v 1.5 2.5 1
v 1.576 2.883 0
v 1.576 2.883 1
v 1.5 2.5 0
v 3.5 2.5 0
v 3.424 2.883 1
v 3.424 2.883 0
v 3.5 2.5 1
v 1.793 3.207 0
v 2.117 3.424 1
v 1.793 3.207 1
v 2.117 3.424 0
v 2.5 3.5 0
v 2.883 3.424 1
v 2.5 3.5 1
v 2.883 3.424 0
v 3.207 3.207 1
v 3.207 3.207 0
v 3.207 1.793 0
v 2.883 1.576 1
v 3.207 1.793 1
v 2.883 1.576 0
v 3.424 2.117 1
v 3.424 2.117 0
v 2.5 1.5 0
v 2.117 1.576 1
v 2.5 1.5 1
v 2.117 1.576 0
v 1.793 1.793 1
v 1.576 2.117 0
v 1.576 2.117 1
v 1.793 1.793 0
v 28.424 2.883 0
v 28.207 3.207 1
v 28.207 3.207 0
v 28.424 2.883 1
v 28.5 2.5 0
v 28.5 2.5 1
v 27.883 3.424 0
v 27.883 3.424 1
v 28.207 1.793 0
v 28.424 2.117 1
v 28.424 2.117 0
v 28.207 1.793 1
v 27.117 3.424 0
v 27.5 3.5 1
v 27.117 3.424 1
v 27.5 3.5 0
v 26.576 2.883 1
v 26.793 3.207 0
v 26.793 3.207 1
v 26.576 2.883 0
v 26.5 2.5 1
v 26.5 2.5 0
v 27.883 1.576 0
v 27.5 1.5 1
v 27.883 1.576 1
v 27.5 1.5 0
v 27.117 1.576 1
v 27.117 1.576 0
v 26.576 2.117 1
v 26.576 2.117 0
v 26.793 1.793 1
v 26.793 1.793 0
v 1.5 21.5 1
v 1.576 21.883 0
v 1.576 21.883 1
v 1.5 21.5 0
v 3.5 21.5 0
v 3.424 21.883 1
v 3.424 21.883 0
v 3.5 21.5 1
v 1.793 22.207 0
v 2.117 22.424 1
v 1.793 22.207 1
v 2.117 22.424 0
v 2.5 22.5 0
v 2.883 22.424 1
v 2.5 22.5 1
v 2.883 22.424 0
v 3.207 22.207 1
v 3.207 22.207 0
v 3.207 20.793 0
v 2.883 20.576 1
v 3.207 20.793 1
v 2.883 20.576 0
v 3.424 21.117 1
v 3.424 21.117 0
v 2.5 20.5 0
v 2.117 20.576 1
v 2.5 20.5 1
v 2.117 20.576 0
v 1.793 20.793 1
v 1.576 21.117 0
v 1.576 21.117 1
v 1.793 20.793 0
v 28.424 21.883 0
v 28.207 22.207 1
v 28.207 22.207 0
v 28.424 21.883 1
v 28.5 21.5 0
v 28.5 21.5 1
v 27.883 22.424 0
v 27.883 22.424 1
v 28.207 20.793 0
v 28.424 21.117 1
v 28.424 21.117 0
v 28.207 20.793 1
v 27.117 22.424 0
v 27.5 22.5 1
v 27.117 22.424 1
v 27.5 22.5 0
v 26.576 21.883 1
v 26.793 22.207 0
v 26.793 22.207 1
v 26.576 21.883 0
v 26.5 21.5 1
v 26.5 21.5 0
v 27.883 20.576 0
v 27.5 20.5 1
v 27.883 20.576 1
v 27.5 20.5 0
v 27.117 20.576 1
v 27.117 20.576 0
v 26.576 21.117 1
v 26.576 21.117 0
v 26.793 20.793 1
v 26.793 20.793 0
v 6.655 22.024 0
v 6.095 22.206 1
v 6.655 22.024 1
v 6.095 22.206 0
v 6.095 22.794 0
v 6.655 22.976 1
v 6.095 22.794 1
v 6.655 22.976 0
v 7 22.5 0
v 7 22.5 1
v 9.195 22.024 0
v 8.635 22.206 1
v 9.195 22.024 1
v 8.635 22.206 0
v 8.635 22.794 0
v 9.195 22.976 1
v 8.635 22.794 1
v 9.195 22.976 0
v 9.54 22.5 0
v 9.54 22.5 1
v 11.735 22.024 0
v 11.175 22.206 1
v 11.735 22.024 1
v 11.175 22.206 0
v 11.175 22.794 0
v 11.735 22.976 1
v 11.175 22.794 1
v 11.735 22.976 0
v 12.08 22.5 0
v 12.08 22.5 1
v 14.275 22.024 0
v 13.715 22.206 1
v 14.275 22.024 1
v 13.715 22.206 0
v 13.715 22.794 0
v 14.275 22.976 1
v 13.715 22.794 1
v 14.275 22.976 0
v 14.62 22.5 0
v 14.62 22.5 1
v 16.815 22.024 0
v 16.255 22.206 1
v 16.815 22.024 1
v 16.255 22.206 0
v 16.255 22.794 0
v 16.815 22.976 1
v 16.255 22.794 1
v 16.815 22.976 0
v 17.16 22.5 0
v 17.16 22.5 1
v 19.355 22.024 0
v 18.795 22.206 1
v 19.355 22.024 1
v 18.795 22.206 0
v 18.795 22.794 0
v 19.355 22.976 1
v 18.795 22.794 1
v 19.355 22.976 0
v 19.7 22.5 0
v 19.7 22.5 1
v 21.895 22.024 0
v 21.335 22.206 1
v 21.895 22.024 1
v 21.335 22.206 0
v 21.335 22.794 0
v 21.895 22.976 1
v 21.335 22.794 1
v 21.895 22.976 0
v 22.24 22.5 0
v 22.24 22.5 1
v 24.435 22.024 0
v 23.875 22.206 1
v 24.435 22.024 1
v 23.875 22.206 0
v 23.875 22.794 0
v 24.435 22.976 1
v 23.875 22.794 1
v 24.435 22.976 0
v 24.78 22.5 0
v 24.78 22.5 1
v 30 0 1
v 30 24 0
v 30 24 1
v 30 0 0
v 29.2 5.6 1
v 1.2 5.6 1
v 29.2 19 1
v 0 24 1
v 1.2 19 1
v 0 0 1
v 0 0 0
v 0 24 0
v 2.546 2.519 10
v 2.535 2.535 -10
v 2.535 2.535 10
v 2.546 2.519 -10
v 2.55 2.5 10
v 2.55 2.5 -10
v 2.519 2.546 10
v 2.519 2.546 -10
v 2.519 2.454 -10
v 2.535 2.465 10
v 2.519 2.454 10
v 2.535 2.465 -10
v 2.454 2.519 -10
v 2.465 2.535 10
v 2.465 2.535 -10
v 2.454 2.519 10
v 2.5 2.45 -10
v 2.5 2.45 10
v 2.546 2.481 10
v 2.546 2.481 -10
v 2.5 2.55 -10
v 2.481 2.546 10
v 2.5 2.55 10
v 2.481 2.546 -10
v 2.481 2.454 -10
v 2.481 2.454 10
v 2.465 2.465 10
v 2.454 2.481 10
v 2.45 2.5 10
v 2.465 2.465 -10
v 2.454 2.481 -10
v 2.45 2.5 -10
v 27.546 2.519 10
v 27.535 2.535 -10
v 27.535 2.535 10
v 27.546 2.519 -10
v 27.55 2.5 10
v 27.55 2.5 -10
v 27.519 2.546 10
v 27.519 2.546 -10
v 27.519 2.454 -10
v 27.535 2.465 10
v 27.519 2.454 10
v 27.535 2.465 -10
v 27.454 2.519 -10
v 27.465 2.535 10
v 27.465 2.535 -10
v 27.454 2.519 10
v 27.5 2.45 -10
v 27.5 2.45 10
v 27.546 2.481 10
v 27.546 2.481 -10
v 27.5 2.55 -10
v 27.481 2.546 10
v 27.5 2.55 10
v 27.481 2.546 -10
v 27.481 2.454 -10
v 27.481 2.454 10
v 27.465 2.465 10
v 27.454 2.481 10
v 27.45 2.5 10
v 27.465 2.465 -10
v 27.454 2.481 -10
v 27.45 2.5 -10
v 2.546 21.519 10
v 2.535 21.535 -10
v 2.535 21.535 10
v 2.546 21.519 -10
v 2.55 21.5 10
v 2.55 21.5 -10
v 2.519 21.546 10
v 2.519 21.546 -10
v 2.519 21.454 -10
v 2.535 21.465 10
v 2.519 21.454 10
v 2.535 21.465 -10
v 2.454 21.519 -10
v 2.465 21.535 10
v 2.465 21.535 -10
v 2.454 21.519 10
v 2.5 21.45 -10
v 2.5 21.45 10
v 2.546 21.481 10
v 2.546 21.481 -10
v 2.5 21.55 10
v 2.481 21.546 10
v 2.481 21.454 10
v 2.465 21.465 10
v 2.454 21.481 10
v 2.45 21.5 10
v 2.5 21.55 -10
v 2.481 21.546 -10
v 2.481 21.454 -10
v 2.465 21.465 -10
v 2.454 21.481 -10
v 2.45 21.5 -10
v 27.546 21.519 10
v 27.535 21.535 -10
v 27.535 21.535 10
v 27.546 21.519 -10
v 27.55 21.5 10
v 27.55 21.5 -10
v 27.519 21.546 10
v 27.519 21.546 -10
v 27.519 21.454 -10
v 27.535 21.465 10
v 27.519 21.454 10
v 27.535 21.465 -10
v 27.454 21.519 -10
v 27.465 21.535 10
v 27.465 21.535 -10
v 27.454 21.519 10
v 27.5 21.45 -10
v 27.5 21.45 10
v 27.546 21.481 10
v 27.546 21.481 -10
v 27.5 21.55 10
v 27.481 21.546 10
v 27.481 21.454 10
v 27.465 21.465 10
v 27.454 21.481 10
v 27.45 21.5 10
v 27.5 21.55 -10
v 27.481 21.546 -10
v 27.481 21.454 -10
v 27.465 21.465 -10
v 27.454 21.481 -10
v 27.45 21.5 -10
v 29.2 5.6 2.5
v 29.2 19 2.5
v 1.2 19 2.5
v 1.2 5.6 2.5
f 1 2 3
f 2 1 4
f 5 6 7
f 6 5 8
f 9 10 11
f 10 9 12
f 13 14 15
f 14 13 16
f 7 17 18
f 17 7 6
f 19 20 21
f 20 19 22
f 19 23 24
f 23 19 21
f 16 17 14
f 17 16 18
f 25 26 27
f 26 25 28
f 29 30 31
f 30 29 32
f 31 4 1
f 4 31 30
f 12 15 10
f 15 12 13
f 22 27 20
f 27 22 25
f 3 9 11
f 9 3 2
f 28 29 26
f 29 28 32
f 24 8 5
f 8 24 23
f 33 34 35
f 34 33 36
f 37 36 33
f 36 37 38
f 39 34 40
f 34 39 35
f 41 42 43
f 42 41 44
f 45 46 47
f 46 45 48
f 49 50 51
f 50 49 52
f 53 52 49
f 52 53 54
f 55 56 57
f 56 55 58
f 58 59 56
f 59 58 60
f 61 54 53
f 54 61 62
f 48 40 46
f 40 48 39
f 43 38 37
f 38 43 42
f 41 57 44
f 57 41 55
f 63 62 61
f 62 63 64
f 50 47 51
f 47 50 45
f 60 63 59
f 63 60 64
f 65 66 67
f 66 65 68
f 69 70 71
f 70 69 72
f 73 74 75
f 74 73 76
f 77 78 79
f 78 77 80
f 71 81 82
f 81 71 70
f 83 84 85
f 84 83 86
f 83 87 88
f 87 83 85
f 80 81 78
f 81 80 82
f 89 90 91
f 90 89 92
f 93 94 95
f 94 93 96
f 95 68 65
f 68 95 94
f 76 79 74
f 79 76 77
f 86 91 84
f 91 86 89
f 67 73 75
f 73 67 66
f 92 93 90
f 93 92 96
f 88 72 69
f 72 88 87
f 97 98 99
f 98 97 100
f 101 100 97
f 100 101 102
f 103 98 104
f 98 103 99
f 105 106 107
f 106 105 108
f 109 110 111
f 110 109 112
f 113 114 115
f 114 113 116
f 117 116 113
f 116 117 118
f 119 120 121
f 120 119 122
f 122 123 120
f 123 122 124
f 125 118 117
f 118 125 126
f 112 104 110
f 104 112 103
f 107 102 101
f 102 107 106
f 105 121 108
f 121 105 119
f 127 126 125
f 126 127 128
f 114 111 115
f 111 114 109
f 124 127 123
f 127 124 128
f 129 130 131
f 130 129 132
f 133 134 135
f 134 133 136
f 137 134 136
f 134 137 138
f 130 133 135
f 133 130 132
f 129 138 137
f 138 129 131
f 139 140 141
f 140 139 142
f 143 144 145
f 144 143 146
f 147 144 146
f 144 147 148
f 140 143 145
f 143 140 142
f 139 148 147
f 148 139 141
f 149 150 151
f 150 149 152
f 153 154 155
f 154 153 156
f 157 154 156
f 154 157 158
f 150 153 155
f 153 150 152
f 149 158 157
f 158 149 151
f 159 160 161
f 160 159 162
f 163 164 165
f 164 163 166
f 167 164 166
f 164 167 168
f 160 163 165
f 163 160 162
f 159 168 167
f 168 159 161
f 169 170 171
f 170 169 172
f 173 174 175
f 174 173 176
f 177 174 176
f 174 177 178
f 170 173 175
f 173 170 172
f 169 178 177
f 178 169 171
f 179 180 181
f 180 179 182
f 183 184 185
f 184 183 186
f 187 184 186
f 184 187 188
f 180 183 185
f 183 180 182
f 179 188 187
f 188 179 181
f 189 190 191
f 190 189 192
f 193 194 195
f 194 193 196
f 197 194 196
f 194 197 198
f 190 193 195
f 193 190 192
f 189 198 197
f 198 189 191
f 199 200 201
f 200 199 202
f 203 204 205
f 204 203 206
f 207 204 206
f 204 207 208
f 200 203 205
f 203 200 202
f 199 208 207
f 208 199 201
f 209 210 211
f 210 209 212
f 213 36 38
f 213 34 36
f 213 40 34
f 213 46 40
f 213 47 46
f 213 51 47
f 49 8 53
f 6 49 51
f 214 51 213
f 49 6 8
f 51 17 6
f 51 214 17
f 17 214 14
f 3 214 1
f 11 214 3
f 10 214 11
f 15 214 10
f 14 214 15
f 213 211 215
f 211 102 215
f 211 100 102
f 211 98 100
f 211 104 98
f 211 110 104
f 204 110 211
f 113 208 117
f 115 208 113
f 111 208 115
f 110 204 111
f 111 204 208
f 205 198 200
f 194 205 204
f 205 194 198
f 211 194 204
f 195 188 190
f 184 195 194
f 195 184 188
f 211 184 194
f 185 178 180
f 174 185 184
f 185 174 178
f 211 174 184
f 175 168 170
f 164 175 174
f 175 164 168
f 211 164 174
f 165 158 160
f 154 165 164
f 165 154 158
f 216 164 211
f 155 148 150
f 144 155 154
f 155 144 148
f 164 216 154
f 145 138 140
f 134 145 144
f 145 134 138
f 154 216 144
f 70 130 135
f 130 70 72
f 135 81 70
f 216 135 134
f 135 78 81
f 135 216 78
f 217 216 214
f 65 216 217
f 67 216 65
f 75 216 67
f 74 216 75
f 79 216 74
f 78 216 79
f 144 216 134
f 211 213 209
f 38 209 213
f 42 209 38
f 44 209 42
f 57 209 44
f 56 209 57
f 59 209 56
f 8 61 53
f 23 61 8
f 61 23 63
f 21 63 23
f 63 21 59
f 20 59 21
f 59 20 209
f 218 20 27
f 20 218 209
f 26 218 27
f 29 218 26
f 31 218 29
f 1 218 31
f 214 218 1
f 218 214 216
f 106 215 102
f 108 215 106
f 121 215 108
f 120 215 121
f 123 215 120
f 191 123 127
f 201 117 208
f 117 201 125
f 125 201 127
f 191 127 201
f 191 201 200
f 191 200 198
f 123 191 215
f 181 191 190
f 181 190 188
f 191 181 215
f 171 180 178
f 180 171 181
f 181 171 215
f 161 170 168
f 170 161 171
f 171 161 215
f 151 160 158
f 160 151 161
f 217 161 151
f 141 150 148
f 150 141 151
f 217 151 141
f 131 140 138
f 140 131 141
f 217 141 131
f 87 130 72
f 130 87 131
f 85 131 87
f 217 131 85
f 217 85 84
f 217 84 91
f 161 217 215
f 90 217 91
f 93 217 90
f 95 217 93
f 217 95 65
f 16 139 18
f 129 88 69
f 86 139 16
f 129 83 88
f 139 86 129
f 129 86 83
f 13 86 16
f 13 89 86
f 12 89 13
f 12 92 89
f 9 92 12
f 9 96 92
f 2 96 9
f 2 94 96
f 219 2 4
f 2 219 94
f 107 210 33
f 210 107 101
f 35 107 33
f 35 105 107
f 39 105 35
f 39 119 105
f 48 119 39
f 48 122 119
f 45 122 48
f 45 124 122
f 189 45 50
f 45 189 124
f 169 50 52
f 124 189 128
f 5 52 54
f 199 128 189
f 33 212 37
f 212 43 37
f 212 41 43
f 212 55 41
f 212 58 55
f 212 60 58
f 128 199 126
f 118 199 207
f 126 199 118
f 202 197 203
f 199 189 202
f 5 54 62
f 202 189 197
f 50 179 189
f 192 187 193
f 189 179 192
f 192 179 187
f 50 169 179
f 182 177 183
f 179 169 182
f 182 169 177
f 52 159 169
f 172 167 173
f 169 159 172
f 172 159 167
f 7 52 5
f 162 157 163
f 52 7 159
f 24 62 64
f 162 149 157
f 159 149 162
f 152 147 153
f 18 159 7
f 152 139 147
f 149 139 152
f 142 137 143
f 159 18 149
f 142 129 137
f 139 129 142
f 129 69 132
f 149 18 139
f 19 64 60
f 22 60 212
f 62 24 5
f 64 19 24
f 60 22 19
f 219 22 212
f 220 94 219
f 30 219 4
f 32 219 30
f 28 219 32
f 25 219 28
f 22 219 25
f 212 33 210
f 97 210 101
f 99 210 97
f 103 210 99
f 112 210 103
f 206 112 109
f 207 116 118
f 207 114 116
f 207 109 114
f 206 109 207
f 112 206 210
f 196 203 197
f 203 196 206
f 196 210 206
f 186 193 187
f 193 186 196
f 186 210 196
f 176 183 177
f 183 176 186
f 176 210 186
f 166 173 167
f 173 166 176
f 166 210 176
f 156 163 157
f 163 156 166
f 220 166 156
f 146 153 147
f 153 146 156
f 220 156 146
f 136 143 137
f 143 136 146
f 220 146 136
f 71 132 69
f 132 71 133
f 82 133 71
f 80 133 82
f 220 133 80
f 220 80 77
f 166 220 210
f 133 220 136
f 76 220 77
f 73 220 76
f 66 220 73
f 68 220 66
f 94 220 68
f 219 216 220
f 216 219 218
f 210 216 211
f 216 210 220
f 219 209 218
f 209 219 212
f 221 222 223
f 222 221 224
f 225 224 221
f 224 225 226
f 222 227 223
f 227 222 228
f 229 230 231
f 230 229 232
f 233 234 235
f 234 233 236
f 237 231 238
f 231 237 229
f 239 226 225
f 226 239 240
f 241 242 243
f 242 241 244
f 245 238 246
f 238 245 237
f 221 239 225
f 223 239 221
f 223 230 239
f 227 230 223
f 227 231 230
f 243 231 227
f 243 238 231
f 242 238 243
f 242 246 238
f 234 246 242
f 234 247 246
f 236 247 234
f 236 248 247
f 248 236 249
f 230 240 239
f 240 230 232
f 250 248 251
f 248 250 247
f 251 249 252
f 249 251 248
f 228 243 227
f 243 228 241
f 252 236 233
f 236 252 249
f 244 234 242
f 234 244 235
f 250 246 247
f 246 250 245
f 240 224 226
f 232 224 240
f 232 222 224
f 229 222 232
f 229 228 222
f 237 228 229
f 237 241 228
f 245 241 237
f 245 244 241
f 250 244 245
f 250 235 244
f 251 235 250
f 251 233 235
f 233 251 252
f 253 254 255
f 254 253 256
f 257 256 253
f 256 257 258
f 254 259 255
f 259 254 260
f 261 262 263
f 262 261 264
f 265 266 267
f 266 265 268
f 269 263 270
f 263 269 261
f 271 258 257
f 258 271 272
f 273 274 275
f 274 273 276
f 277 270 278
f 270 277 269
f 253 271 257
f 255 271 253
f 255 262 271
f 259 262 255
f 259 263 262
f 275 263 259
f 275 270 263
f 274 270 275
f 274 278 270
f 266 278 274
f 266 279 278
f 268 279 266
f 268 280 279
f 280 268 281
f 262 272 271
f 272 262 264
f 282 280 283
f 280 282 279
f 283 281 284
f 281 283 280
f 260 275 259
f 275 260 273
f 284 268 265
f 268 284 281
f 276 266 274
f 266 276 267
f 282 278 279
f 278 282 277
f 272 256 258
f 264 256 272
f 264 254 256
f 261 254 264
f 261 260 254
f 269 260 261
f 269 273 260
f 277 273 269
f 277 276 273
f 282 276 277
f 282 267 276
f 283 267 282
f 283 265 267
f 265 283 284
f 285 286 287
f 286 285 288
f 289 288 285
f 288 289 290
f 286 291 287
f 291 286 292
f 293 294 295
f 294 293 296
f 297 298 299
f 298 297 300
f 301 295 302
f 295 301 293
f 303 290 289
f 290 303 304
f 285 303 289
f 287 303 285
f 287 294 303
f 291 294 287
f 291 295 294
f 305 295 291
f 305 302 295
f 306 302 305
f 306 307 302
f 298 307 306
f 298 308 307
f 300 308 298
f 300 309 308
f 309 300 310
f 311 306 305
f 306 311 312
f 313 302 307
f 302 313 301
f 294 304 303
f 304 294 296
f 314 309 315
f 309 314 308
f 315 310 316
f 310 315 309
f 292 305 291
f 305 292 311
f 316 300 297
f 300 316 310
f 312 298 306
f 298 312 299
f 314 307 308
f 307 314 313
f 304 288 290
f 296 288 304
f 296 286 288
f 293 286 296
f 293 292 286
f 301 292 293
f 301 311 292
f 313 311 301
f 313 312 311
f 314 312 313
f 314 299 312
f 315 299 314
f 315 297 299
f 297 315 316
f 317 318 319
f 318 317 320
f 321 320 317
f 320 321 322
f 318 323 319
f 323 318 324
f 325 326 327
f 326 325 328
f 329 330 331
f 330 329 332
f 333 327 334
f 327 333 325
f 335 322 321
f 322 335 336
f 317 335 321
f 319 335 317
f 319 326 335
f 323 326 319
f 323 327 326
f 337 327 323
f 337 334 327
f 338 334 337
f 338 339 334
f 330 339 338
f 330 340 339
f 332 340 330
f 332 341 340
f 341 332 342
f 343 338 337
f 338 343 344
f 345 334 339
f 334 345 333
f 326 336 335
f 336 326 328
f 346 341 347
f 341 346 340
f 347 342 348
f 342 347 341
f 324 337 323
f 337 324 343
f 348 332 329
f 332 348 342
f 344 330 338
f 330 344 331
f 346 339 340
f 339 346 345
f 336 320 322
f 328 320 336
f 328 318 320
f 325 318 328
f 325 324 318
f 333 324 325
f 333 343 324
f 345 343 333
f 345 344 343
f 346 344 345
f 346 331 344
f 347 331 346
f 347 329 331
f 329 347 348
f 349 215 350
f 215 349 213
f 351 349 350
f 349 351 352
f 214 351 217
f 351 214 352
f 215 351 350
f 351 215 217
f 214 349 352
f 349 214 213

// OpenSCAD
module drill(hole=[], d=1, rotation=[0,0,0]) {
  module _drill(hole=[],d) {
    $fn=16;
    translate(hole) rotate(rotation) cylinder(d=d, h=20);
  }
  for(h = hole) {
    _drill(hole=h,d=d);
  }
}


module screen0_96 (guide=false) {
  //module drill(guide=false) {
  //  module _drill(d) {
  //    $fn=16;
  //    translate ([2.5,2.5,-1]) cylinder(h=20,d=d,center=true);
  //    translate ([27.5,2.5,-1]) cylinder(h=20,d=d,center=true);
  //    translate ([2.5,21.5,-1]) cylinder(h=20,d=d,center=true);
  //    translate ([27.5,21.5,-1]) cylinder(h=20,d=d,center=true);
  //  }
  //  if(guide==true) _drill(0.1); else _drill(2);
  //}

  hole=[
    [2.5,2.5,-10],
    [27.5,2.5,-10],
    [2.5,21.5,-10],
    [27.5,21.5,-10]
  ];

  difference() {
    color("blue") cube([30,24,1]);
    drill(hole=hole,d=2);
    for (i = [0 : 7]){
      translate ([6.5+i*2.54,22.5,-1]) cylinder(h=3,d=1);
    }
  }
  if (guide==true) drill(hole=hole,d=0.1);
  translate([1.2,5.6,1]) color("black")cube([28,13.4,1.5]);
}

screen0_96(guide=true);

module joystick (guide=false) {
  module drill(guide=false) {
    module _drill(d) {
      $fn=16;
      translate ([3,3,-1]) cylinder(h=20,d=d,center=true);
      translate ([3,17,-1]) cylinder(h=20,d=d,center=true);
      translate ([19.5,3,-1]) cylinder(h=20,d=d,center=true);
      translate ([19.5,17,-1]) cylinder(h=20,d=d,center=true);
    }
    if(guide==true) _drill(0.1); else _drill(2);
  }
    difference() {
        color("blue") cube([25,20,1.5]);
        drill();
        for (i = [0 : 5]){
            translate ([23.5,3.5+i*2.54,-1]) cylinder(h=3,d=1);
        }
    }
    if (guide==true) drill(guide=true);
    translate([6.5,4.6,1.5]) {
        color("grey")cube([10,10.5,2.5]);
        translate([5,5.25,2.5])color("black")cylinder(h=2.5,d=3.7);
        translate([5,5.25,7])color("grey")cube([2.5,2.5,4],center=true);
    }
    // axe
    translate ([3,3,-1]) cylinder(h=5,d=0.1);
    translate ([3,17,-1]) cylinder(h=5,d=0.1);
    translate ([19.5,3,-1]) cylinder(h=5,d=0.1);
    translate ([19.5,17,-1]) cylinder(h=5,d=0.1);
    
}

//joystick(guide=true);
